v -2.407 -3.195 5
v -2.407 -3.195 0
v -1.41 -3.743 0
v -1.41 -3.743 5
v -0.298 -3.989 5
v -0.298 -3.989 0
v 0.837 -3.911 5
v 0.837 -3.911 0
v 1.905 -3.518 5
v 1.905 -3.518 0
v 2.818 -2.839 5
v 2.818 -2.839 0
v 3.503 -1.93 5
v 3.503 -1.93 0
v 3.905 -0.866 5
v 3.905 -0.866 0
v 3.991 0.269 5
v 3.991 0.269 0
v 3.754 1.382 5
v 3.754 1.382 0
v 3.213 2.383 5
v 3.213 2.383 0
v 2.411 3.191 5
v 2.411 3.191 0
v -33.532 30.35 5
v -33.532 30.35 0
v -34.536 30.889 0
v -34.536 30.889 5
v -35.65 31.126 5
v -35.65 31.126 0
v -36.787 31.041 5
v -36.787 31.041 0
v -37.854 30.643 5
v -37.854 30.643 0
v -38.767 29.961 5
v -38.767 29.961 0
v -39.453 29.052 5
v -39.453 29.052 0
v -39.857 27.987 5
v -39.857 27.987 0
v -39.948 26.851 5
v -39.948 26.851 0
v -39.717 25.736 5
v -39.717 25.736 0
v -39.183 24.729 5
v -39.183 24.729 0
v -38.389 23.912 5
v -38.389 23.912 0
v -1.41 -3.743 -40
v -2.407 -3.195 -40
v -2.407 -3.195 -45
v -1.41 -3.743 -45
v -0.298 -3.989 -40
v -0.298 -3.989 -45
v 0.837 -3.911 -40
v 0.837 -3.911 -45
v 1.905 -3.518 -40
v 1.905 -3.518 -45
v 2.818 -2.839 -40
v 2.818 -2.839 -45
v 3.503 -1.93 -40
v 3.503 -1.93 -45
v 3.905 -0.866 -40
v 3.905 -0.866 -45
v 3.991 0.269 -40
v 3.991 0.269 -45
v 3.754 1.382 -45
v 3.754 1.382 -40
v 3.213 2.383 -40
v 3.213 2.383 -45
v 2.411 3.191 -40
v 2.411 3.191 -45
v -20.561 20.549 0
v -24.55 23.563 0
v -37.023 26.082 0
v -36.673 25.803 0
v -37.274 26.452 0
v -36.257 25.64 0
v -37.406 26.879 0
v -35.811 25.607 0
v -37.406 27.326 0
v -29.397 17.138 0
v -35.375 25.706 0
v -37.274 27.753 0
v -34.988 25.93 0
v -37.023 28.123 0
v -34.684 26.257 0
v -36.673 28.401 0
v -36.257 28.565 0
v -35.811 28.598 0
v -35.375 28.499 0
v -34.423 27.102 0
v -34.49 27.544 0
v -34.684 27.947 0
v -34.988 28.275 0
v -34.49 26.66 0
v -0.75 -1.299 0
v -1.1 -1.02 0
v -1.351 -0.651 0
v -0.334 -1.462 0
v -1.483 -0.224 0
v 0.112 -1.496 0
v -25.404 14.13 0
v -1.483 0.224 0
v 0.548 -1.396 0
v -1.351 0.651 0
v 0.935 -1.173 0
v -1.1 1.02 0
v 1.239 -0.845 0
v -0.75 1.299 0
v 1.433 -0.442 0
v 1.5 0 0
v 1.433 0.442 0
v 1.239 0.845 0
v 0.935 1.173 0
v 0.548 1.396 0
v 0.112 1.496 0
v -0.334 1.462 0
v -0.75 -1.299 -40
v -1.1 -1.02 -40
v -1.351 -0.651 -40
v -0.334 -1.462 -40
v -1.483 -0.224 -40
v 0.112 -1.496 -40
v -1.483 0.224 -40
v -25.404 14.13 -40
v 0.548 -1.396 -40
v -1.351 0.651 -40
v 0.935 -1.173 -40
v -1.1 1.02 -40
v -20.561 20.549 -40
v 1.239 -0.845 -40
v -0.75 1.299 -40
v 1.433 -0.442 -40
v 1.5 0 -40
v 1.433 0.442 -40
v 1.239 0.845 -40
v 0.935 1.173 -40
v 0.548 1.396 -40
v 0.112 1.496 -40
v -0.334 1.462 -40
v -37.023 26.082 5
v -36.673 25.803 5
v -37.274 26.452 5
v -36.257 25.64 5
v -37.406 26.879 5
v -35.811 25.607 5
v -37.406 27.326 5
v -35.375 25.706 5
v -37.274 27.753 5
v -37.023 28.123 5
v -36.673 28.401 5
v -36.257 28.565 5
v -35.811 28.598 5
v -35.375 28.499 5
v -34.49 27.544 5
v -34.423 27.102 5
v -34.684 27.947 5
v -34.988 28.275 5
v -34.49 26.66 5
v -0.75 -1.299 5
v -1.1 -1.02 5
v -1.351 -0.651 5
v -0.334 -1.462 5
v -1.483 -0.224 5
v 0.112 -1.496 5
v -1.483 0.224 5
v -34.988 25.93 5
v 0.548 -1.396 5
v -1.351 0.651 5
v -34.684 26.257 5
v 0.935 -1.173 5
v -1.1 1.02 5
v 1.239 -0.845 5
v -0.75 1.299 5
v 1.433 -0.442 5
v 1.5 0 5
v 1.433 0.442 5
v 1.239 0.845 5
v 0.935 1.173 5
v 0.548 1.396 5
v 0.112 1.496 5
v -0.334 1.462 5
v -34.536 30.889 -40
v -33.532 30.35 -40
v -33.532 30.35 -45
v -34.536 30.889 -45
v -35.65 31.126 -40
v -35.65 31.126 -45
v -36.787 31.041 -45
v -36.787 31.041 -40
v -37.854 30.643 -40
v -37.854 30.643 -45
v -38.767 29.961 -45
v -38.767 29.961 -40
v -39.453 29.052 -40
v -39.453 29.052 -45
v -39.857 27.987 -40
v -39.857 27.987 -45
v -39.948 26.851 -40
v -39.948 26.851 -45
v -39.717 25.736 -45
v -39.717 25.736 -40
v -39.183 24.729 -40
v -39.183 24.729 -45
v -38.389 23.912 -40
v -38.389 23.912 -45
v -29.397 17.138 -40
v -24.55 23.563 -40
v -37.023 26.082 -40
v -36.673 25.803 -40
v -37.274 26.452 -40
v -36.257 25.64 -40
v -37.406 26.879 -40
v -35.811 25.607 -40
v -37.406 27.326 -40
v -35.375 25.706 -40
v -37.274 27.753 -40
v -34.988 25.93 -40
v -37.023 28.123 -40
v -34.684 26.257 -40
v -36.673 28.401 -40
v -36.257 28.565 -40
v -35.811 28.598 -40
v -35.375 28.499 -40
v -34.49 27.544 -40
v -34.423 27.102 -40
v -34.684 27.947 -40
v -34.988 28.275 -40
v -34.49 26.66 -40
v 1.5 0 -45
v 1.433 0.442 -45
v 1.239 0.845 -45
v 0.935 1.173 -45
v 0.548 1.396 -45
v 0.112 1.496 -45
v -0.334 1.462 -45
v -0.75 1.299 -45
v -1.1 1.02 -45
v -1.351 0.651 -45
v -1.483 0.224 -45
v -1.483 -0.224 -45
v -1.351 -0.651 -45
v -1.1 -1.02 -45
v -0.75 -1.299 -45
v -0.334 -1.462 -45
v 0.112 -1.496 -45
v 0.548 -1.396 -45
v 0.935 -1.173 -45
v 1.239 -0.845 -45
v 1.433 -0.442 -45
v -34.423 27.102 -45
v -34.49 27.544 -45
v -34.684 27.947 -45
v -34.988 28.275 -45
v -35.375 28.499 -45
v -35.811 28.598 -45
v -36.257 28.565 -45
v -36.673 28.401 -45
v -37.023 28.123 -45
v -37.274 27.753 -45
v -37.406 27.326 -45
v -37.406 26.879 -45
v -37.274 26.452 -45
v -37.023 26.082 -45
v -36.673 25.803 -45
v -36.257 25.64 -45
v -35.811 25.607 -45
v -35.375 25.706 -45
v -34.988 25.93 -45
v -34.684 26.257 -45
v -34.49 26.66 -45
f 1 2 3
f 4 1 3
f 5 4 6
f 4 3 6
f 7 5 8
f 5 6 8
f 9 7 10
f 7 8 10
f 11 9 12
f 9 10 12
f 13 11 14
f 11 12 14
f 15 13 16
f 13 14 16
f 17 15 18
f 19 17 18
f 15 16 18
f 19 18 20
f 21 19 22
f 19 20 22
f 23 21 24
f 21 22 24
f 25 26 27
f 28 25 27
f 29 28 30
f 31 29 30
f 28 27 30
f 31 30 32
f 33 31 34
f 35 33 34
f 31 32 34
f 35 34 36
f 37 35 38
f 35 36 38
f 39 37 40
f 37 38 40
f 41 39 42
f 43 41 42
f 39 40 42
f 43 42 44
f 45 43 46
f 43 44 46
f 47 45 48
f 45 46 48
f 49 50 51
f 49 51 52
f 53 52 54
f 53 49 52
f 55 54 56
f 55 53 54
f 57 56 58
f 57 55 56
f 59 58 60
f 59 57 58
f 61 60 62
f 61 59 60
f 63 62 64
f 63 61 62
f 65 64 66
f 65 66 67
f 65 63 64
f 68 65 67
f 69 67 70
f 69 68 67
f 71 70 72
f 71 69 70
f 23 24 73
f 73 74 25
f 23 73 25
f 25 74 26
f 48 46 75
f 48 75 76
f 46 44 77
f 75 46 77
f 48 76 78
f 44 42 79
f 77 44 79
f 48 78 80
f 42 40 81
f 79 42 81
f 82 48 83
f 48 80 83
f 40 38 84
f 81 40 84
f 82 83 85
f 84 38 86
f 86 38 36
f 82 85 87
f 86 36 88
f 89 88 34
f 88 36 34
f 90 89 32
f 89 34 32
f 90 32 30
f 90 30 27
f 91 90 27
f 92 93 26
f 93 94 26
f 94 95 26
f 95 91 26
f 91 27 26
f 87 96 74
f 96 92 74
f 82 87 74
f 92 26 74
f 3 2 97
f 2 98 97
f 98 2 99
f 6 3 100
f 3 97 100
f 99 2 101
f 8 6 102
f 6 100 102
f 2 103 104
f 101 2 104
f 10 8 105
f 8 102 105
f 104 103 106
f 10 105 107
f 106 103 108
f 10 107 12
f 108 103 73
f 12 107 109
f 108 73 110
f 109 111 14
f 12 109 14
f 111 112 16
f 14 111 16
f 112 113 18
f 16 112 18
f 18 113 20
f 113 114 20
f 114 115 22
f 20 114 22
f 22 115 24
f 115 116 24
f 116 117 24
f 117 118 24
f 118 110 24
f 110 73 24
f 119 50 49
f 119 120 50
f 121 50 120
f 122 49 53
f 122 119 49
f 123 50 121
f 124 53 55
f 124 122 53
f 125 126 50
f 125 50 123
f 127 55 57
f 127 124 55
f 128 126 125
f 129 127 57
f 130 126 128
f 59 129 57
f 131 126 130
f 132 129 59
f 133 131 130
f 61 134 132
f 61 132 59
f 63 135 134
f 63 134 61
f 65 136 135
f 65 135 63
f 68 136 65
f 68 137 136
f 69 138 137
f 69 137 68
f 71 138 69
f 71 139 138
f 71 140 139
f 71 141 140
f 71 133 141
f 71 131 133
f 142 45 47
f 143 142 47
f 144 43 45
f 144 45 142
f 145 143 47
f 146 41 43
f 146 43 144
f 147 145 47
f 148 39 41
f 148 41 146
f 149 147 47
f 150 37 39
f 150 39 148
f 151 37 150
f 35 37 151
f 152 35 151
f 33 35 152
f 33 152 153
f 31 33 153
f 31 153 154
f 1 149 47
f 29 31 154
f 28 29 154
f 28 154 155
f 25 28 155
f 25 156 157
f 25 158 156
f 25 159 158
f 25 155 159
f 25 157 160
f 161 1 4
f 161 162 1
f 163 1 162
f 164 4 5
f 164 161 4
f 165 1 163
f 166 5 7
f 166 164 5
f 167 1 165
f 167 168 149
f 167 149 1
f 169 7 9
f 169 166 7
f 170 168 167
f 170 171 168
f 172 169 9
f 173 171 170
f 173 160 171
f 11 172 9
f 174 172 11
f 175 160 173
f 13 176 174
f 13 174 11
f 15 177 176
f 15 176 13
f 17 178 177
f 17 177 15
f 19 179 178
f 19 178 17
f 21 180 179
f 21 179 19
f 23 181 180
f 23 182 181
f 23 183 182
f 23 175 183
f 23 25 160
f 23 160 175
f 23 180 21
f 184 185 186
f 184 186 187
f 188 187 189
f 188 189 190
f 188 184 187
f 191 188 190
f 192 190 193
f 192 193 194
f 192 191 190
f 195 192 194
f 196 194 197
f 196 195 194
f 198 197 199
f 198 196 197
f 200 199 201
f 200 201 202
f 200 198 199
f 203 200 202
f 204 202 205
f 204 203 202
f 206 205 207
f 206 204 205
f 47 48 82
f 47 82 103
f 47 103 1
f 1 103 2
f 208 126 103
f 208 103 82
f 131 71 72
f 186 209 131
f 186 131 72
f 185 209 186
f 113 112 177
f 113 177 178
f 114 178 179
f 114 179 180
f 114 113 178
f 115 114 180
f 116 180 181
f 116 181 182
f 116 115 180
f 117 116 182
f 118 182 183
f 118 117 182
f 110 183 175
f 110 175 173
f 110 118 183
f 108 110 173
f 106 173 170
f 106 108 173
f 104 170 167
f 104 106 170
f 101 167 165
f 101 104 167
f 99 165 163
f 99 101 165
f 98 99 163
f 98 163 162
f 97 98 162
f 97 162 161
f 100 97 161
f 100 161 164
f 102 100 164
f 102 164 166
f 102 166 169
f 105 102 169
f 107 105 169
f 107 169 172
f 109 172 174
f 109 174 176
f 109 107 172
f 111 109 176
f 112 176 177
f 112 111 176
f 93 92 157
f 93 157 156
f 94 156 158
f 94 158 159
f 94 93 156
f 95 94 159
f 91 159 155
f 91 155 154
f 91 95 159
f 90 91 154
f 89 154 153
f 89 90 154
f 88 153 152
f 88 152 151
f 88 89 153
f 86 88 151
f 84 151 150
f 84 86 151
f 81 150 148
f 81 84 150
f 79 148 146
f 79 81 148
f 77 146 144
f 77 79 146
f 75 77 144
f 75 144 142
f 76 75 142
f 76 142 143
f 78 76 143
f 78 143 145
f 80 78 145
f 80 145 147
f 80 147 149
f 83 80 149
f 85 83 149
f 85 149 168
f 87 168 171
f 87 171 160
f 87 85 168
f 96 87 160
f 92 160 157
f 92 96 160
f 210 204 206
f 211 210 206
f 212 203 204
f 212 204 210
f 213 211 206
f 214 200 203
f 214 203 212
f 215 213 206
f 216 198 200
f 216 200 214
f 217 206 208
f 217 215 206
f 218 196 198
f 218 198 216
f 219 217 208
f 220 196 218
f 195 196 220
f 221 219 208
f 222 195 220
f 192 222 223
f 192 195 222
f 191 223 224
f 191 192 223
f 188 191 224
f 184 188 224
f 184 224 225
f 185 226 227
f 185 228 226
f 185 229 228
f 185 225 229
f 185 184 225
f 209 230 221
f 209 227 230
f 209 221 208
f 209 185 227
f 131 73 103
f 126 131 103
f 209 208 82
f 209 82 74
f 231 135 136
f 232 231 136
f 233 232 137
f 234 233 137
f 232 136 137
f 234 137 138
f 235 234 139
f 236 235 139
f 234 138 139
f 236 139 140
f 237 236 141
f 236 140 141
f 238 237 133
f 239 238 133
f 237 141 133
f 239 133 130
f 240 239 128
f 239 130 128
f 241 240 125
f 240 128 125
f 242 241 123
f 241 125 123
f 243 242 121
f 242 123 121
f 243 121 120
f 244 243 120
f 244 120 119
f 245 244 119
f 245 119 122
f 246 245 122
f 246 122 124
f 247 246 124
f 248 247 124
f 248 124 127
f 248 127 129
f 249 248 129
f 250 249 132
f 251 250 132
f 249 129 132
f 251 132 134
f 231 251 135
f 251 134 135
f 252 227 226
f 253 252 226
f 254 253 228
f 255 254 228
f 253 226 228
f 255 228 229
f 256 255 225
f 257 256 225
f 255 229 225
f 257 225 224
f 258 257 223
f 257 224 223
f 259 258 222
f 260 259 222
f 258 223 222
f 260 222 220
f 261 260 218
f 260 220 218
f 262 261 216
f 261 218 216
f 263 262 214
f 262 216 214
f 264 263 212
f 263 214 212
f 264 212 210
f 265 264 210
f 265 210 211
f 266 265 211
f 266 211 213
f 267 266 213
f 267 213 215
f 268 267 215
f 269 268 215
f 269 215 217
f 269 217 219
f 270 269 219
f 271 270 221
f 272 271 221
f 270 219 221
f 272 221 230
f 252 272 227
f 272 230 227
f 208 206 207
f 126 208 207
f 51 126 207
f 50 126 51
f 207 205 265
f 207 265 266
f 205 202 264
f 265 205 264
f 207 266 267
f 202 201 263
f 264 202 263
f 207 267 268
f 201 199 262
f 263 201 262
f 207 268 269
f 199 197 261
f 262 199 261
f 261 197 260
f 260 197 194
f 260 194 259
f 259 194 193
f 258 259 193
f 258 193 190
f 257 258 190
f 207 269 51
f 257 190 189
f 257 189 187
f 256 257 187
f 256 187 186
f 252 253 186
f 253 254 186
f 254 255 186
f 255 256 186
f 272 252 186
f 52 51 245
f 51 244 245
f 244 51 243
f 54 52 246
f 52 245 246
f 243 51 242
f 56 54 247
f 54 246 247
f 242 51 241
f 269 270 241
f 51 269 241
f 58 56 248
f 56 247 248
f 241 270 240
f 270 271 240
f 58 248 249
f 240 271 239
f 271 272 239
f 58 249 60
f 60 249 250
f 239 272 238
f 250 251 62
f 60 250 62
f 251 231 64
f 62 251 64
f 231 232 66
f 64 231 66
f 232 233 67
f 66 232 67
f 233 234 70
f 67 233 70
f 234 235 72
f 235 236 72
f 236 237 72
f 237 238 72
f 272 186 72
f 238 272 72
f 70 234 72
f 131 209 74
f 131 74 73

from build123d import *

# Parameters (mm, degrees)
ESQUISSE1_R        = 1.5
BOSS_EXTRU_1_DEPTH = 5
BOSS_EXTRU_2_DEPTH = 20


with BuildPart() as part:
    # Esquisse1 → Boss.-Extru.1 (new body)
    with BuildSketch(Plane.XY):
        with BuildLine():
            Line((2.411392109, 3.191424149), (-33.53228234, 30.349924212))
            ThreePointArc((-33.53228234, 30.349924212), (-39.142258528, 29.531111427), (-38.389494778, 23.911891379))
            Line((-38.389494778, 23.911891379), (-2.406799918, -3.194888755))
            ThreePointArc((-2.406799918, -3.194888755), (3.193157277, -2.409096636), (2.411392109, 3.191424149))
        make_face()
        with Locations((-35.923019369, 27.102337158)):
            Circle(ESQUISSE1_R, mode=Mode.SUBTRACT)
        Circle(ESQUISSE1_R, mode=Mode.SUBTRACT)
    boss_extru_1 = extrude(amount=BOSS_EXTRU_1_DEPTH)

    # Esquisse2 → Boss.-Extru.2 (add)
    with BuildSketch(Plane(origin=(0, 0, 0), x_dir=(-1, 0, 0), z_dir=(0, 0, -1))):
        Polygon((20.560906603, 20.548947707), (25.40403733, 14.129579595), (29.397447291, 17.137928086), (24.549986024, 23.563036149), align=None)
    boss_extru_2 = extrude(amount=BOSS_EXTRU_2_DEPTH)

    # Symétrie1: Boss.-Extru.1, Boss.-Extru.2 across plane
    add(boss_extru_1.mirror(Plane.XY.offset(-20)))
    add(boss_extru_2.mirror(Plane.XY.offset(-20)))


solid = part.part
